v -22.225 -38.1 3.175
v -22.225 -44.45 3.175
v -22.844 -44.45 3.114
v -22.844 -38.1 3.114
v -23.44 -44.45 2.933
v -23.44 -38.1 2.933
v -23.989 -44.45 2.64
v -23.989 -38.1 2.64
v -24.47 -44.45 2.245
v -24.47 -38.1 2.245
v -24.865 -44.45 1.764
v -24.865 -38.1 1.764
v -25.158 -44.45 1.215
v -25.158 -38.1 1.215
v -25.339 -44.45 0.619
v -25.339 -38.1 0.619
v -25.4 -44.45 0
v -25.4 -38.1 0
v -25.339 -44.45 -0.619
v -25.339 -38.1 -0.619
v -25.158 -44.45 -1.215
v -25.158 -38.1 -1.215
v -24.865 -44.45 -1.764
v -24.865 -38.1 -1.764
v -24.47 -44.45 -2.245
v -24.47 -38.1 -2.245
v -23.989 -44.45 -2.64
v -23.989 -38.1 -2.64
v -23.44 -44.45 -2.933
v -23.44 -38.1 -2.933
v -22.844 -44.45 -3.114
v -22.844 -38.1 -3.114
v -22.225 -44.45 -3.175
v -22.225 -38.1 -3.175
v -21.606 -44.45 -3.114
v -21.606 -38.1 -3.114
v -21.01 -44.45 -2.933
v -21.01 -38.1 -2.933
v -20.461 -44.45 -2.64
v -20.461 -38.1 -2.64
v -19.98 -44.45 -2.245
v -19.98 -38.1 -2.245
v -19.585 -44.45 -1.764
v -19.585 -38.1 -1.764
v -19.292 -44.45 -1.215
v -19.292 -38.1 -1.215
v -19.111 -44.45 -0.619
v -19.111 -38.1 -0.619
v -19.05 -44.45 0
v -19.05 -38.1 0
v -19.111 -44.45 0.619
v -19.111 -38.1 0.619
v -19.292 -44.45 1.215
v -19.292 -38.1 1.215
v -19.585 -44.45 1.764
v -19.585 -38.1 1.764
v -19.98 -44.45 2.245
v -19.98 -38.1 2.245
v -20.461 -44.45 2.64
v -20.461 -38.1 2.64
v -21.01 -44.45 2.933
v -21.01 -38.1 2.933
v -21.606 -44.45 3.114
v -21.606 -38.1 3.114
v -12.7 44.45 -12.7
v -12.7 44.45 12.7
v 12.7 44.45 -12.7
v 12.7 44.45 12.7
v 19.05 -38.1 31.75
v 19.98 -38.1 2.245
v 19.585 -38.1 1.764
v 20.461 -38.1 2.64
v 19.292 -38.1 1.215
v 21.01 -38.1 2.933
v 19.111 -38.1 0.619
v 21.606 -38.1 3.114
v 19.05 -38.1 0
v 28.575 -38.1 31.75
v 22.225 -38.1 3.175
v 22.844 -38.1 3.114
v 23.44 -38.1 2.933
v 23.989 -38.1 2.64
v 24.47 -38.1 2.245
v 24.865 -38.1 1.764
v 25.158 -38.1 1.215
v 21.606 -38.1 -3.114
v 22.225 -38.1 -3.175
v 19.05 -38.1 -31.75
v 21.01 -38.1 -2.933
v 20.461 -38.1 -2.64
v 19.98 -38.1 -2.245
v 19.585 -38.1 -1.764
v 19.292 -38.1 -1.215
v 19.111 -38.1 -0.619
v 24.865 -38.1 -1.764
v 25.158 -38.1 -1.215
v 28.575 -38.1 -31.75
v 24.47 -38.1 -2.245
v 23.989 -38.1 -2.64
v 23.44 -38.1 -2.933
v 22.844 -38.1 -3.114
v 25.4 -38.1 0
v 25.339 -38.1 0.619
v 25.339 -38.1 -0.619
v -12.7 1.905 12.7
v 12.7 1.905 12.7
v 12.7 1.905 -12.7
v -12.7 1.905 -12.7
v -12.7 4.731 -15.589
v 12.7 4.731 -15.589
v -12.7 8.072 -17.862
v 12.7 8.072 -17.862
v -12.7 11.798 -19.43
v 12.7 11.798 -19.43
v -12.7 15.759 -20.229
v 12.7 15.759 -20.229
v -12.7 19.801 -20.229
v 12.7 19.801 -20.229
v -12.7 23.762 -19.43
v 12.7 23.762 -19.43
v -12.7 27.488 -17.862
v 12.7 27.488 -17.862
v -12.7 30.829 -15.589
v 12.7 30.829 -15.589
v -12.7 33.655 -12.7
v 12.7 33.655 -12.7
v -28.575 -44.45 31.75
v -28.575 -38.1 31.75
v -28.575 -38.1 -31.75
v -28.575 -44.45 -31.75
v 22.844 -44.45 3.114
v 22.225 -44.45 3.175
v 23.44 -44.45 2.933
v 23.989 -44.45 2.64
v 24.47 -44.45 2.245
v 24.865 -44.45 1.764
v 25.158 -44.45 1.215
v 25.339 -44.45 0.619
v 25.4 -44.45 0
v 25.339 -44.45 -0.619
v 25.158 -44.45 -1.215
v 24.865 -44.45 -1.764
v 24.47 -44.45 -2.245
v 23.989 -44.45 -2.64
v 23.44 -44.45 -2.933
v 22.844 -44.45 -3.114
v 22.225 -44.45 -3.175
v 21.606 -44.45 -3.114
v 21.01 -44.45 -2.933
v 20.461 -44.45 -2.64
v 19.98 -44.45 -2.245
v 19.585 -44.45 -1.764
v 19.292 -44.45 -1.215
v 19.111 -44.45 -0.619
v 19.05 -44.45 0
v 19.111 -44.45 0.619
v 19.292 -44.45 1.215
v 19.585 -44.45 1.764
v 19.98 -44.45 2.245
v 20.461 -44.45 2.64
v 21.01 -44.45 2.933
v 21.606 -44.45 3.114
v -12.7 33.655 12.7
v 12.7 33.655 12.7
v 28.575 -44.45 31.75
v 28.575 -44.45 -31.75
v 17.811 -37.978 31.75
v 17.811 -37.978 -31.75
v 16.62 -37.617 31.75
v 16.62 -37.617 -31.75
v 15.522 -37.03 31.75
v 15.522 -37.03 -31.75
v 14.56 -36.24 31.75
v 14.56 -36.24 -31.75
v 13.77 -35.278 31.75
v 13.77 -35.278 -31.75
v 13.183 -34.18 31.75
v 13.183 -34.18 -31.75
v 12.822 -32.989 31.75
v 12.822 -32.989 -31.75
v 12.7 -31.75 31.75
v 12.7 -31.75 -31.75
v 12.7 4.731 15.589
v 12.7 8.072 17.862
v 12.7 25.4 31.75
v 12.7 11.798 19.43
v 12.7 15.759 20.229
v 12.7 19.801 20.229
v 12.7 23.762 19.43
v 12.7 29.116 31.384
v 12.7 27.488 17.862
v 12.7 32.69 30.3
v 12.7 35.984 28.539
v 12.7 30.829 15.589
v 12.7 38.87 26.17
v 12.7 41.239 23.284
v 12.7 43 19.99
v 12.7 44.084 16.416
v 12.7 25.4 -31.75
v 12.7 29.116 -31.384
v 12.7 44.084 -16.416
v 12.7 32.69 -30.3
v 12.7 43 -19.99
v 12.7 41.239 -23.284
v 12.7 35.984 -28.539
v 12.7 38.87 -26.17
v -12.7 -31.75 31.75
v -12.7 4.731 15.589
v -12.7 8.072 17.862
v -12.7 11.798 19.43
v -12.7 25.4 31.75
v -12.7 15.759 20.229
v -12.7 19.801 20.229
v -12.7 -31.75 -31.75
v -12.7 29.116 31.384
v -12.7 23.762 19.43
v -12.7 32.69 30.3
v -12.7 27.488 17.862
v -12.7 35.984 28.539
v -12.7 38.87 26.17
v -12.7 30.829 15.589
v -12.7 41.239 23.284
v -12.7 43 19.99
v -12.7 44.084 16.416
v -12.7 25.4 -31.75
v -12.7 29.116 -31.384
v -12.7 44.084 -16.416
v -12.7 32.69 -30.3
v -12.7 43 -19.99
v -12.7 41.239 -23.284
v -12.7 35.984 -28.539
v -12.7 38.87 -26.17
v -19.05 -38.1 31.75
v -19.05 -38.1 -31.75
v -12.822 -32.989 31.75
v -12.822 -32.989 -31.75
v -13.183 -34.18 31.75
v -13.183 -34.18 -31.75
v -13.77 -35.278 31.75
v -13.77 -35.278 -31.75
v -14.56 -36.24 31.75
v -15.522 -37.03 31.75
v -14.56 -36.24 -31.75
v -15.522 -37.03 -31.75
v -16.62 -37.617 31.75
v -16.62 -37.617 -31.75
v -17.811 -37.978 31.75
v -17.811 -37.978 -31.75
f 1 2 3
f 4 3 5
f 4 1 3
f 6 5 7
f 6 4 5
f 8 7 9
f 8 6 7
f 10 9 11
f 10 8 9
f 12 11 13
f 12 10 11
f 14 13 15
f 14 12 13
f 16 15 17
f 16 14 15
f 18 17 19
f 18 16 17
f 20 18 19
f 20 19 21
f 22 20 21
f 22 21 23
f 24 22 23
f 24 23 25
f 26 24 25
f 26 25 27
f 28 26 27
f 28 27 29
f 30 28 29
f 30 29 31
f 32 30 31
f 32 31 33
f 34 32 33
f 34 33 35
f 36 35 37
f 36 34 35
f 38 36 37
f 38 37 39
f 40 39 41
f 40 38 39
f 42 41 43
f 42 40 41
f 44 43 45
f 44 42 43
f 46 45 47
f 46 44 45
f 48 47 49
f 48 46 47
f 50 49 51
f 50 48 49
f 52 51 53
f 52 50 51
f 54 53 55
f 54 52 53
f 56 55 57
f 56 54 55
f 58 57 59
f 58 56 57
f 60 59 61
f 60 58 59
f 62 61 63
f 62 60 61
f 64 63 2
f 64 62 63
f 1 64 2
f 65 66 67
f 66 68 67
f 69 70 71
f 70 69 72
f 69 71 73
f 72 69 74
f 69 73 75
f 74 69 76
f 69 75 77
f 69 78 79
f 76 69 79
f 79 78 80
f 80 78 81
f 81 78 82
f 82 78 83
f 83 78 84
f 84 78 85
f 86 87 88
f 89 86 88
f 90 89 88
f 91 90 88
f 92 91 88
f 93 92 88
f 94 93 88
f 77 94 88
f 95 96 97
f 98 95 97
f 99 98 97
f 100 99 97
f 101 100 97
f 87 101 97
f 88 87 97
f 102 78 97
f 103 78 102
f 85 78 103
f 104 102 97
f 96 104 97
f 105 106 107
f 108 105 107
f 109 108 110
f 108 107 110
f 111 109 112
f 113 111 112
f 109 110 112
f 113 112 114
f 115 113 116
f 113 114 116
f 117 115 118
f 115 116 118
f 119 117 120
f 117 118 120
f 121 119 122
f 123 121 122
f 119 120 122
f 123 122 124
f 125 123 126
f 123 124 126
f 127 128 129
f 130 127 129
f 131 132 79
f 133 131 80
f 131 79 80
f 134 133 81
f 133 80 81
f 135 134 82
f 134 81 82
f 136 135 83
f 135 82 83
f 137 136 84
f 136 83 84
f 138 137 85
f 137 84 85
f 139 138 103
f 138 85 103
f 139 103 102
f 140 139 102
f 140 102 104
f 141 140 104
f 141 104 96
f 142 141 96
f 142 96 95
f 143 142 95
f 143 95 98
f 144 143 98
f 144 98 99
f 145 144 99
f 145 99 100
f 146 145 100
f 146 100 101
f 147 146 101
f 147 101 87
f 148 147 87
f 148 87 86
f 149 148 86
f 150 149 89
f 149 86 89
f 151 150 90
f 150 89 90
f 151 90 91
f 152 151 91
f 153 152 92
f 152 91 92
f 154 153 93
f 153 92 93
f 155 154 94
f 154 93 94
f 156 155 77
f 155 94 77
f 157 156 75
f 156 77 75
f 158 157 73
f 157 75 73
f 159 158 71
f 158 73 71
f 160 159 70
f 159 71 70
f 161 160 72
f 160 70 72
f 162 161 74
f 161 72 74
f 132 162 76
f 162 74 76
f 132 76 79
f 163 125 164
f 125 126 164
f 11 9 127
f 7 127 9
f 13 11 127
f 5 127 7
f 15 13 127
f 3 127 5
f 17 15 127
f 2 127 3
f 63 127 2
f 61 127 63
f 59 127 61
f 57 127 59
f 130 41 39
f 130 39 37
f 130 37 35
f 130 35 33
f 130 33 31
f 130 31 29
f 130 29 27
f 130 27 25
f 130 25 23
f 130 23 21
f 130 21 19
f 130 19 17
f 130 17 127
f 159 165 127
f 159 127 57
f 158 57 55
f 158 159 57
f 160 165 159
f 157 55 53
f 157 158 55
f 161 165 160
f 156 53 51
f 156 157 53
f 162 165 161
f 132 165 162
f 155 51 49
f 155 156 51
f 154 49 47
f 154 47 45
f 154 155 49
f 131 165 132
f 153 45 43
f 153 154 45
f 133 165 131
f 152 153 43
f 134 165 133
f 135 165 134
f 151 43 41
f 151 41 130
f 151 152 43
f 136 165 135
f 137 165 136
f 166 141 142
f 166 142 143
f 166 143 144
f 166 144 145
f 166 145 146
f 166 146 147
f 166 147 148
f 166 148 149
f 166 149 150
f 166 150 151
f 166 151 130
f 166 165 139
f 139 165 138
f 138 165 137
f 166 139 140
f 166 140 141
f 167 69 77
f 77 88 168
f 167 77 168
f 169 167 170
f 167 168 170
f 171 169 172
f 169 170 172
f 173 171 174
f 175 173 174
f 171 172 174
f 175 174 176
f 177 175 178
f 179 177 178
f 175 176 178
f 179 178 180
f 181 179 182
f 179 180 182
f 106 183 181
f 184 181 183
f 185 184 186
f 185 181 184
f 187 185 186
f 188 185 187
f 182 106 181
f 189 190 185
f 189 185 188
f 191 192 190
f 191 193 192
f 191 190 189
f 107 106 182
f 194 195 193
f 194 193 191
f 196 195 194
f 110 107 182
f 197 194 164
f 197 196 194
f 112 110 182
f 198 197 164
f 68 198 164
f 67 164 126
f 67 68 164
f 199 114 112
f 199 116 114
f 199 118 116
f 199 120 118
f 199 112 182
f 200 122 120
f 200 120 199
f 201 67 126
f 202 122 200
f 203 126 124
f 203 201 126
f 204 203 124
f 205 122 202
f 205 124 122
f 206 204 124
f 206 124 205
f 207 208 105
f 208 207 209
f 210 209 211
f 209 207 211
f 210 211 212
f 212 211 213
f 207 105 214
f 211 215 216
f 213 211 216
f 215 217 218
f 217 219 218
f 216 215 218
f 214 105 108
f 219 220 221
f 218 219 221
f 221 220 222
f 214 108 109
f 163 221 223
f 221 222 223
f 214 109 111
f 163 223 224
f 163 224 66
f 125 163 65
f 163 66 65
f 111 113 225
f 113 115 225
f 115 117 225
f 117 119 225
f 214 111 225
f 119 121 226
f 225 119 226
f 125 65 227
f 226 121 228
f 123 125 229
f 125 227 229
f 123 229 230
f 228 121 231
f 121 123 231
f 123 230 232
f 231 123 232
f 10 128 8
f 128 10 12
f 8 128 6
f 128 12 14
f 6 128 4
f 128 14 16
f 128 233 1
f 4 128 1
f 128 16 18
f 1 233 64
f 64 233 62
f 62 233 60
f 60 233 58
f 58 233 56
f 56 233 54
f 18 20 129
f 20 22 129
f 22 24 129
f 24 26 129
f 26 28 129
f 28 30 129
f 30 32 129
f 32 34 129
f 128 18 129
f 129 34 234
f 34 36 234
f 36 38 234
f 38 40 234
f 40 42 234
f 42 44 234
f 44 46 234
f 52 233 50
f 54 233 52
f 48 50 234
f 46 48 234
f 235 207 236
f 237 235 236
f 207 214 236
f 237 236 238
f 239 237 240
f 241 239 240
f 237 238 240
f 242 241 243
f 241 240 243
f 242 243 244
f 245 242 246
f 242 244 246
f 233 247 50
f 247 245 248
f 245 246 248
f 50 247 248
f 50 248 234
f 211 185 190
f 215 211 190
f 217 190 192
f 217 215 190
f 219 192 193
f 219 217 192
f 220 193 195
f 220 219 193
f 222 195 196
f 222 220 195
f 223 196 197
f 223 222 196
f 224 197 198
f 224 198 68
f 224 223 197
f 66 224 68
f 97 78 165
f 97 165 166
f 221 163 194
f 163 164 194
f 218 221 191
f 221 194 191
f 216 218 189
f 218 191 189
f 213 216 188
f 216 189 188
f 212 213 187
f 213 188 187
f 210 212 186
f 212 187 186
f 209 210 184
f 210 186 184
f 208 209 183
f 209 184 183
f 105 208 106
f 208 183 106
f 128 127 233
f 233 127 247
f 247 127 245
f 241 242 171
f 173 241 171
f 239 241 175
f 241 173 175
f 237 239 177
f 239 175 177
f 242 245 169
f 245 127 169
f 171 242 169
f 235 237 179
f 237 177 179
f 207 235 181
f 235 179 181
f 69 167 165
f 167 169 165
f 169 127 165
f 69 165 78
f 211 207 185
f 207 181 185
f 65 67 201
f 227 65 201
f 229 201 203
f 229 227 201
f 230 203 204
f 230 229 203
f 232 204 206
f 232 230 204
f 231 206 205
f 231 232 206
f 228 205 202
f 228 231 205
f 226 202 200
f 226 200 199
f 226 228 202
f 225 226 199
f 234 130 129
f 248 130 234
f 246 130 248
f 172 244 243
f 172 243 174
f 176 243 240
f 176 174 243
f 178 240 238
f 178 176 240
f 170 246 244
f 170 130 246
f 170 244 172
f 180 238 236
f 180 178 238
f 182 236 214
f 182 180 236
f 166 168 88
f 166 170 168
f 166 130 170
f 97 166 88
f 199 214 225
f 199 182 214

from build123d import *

# Parameters (mm, degrees)
SKETCH1_W           = 63.5
SKETCH1_H           = 88.9
BOSS_EXTRUDE1_DEPTH = 12.7
SKETCH2_W           = 63.5
SKETCH2_H           = 6.35
BOSS_EXTRUDE2_DEPTH = 28.575
FILLET1_R           = 6.35
SKETCH3_R           = 3.175
CUT_EXTRUDE1_DEPTH  = 93.946735419
FILLET2_R           = 19.05


with BuildPart() as part:
    # Sketch1 → Boss-Extrude1 (new, symmetric)
    with BuildSketch(Plane(origin=(0, 0, 0), x_dir=(0, 0, -1), z_dir=(1, 0, 0))):
        Rectangle(SKETCH1_W, SKETCH1_H)
        with BuildLine():
            Line((-12.7, 1.905), (12.7, 1.905))
            ThreePointArc((12.7, 1.905), (20.329919454, 17.78), (12.7, 33.655))
            Line((12.7, 33.655), (-12.7, 33.655))
            ThreePointArc((-12.7, 33.655), (-20.329919454, 17.78), (-12.7, 1.905))
        make_face(mode=Mode.SUBTRACT)
    extrude(amount=BOSS_EXTRUDE1_DEPTH, both=True)

    # Sketch2 → Boss-Extrude2 (add, symmetric)
    with BuildSketch(Plane(origin=(0, 0, 0), x_dir=(0, 0, -1), z_dir=(1, 0, 0))):
        with Locations((0, -41.275)):
            Rectangle(SKETCH2_W, SKETCH2_H)
    extrude(amount=BOSS_EXTRUDE2_DEPTH, both=True)

    # Fillet1
    fillet1_edges = [part.edges().sort_by_distance(p)[0] for p in [
        (12.7, -38.1, 0),
        (-12.7, -38.1, 0),
    ]]
    fillet(fillet1_edges, radius=FILLET1_R)

    # Sketch3 → Cut-Extrude1 (cut, through all)
    with BuildSketch(Plane(origin=(0, -38.1, 0), x_dir=(1, 0, 0), z_dir=(0, 1, 0))):
        with Locations(Location((22.225, 0, 0), (0, 0, 270))):
            Circle(SKETCH3_R)
    cut_extrude1 = extrude(amount=-CUT_EXTRUDE1_DEPTH, mode=Mode.SUBTRACT)

    # Mirror1: Cut-Extrude1 across plane
    add(cut_extrude1.mirror(Plane(origin=(0, 0, 0), x_dir=(0, 0, 1), z_dir=(1, 0, 0))), mode=Mode.SUBTRACT)

    # Fillet2
    fillet2_edges = [part.edges().sort_by_distance(p)[0] for p in [
        (0, 44.45, 31.75),
        (0, 44.45, -31.75),
    ]]
    fillet(fillet2_edges, radius=FILLET2_R)


solid = part.part
